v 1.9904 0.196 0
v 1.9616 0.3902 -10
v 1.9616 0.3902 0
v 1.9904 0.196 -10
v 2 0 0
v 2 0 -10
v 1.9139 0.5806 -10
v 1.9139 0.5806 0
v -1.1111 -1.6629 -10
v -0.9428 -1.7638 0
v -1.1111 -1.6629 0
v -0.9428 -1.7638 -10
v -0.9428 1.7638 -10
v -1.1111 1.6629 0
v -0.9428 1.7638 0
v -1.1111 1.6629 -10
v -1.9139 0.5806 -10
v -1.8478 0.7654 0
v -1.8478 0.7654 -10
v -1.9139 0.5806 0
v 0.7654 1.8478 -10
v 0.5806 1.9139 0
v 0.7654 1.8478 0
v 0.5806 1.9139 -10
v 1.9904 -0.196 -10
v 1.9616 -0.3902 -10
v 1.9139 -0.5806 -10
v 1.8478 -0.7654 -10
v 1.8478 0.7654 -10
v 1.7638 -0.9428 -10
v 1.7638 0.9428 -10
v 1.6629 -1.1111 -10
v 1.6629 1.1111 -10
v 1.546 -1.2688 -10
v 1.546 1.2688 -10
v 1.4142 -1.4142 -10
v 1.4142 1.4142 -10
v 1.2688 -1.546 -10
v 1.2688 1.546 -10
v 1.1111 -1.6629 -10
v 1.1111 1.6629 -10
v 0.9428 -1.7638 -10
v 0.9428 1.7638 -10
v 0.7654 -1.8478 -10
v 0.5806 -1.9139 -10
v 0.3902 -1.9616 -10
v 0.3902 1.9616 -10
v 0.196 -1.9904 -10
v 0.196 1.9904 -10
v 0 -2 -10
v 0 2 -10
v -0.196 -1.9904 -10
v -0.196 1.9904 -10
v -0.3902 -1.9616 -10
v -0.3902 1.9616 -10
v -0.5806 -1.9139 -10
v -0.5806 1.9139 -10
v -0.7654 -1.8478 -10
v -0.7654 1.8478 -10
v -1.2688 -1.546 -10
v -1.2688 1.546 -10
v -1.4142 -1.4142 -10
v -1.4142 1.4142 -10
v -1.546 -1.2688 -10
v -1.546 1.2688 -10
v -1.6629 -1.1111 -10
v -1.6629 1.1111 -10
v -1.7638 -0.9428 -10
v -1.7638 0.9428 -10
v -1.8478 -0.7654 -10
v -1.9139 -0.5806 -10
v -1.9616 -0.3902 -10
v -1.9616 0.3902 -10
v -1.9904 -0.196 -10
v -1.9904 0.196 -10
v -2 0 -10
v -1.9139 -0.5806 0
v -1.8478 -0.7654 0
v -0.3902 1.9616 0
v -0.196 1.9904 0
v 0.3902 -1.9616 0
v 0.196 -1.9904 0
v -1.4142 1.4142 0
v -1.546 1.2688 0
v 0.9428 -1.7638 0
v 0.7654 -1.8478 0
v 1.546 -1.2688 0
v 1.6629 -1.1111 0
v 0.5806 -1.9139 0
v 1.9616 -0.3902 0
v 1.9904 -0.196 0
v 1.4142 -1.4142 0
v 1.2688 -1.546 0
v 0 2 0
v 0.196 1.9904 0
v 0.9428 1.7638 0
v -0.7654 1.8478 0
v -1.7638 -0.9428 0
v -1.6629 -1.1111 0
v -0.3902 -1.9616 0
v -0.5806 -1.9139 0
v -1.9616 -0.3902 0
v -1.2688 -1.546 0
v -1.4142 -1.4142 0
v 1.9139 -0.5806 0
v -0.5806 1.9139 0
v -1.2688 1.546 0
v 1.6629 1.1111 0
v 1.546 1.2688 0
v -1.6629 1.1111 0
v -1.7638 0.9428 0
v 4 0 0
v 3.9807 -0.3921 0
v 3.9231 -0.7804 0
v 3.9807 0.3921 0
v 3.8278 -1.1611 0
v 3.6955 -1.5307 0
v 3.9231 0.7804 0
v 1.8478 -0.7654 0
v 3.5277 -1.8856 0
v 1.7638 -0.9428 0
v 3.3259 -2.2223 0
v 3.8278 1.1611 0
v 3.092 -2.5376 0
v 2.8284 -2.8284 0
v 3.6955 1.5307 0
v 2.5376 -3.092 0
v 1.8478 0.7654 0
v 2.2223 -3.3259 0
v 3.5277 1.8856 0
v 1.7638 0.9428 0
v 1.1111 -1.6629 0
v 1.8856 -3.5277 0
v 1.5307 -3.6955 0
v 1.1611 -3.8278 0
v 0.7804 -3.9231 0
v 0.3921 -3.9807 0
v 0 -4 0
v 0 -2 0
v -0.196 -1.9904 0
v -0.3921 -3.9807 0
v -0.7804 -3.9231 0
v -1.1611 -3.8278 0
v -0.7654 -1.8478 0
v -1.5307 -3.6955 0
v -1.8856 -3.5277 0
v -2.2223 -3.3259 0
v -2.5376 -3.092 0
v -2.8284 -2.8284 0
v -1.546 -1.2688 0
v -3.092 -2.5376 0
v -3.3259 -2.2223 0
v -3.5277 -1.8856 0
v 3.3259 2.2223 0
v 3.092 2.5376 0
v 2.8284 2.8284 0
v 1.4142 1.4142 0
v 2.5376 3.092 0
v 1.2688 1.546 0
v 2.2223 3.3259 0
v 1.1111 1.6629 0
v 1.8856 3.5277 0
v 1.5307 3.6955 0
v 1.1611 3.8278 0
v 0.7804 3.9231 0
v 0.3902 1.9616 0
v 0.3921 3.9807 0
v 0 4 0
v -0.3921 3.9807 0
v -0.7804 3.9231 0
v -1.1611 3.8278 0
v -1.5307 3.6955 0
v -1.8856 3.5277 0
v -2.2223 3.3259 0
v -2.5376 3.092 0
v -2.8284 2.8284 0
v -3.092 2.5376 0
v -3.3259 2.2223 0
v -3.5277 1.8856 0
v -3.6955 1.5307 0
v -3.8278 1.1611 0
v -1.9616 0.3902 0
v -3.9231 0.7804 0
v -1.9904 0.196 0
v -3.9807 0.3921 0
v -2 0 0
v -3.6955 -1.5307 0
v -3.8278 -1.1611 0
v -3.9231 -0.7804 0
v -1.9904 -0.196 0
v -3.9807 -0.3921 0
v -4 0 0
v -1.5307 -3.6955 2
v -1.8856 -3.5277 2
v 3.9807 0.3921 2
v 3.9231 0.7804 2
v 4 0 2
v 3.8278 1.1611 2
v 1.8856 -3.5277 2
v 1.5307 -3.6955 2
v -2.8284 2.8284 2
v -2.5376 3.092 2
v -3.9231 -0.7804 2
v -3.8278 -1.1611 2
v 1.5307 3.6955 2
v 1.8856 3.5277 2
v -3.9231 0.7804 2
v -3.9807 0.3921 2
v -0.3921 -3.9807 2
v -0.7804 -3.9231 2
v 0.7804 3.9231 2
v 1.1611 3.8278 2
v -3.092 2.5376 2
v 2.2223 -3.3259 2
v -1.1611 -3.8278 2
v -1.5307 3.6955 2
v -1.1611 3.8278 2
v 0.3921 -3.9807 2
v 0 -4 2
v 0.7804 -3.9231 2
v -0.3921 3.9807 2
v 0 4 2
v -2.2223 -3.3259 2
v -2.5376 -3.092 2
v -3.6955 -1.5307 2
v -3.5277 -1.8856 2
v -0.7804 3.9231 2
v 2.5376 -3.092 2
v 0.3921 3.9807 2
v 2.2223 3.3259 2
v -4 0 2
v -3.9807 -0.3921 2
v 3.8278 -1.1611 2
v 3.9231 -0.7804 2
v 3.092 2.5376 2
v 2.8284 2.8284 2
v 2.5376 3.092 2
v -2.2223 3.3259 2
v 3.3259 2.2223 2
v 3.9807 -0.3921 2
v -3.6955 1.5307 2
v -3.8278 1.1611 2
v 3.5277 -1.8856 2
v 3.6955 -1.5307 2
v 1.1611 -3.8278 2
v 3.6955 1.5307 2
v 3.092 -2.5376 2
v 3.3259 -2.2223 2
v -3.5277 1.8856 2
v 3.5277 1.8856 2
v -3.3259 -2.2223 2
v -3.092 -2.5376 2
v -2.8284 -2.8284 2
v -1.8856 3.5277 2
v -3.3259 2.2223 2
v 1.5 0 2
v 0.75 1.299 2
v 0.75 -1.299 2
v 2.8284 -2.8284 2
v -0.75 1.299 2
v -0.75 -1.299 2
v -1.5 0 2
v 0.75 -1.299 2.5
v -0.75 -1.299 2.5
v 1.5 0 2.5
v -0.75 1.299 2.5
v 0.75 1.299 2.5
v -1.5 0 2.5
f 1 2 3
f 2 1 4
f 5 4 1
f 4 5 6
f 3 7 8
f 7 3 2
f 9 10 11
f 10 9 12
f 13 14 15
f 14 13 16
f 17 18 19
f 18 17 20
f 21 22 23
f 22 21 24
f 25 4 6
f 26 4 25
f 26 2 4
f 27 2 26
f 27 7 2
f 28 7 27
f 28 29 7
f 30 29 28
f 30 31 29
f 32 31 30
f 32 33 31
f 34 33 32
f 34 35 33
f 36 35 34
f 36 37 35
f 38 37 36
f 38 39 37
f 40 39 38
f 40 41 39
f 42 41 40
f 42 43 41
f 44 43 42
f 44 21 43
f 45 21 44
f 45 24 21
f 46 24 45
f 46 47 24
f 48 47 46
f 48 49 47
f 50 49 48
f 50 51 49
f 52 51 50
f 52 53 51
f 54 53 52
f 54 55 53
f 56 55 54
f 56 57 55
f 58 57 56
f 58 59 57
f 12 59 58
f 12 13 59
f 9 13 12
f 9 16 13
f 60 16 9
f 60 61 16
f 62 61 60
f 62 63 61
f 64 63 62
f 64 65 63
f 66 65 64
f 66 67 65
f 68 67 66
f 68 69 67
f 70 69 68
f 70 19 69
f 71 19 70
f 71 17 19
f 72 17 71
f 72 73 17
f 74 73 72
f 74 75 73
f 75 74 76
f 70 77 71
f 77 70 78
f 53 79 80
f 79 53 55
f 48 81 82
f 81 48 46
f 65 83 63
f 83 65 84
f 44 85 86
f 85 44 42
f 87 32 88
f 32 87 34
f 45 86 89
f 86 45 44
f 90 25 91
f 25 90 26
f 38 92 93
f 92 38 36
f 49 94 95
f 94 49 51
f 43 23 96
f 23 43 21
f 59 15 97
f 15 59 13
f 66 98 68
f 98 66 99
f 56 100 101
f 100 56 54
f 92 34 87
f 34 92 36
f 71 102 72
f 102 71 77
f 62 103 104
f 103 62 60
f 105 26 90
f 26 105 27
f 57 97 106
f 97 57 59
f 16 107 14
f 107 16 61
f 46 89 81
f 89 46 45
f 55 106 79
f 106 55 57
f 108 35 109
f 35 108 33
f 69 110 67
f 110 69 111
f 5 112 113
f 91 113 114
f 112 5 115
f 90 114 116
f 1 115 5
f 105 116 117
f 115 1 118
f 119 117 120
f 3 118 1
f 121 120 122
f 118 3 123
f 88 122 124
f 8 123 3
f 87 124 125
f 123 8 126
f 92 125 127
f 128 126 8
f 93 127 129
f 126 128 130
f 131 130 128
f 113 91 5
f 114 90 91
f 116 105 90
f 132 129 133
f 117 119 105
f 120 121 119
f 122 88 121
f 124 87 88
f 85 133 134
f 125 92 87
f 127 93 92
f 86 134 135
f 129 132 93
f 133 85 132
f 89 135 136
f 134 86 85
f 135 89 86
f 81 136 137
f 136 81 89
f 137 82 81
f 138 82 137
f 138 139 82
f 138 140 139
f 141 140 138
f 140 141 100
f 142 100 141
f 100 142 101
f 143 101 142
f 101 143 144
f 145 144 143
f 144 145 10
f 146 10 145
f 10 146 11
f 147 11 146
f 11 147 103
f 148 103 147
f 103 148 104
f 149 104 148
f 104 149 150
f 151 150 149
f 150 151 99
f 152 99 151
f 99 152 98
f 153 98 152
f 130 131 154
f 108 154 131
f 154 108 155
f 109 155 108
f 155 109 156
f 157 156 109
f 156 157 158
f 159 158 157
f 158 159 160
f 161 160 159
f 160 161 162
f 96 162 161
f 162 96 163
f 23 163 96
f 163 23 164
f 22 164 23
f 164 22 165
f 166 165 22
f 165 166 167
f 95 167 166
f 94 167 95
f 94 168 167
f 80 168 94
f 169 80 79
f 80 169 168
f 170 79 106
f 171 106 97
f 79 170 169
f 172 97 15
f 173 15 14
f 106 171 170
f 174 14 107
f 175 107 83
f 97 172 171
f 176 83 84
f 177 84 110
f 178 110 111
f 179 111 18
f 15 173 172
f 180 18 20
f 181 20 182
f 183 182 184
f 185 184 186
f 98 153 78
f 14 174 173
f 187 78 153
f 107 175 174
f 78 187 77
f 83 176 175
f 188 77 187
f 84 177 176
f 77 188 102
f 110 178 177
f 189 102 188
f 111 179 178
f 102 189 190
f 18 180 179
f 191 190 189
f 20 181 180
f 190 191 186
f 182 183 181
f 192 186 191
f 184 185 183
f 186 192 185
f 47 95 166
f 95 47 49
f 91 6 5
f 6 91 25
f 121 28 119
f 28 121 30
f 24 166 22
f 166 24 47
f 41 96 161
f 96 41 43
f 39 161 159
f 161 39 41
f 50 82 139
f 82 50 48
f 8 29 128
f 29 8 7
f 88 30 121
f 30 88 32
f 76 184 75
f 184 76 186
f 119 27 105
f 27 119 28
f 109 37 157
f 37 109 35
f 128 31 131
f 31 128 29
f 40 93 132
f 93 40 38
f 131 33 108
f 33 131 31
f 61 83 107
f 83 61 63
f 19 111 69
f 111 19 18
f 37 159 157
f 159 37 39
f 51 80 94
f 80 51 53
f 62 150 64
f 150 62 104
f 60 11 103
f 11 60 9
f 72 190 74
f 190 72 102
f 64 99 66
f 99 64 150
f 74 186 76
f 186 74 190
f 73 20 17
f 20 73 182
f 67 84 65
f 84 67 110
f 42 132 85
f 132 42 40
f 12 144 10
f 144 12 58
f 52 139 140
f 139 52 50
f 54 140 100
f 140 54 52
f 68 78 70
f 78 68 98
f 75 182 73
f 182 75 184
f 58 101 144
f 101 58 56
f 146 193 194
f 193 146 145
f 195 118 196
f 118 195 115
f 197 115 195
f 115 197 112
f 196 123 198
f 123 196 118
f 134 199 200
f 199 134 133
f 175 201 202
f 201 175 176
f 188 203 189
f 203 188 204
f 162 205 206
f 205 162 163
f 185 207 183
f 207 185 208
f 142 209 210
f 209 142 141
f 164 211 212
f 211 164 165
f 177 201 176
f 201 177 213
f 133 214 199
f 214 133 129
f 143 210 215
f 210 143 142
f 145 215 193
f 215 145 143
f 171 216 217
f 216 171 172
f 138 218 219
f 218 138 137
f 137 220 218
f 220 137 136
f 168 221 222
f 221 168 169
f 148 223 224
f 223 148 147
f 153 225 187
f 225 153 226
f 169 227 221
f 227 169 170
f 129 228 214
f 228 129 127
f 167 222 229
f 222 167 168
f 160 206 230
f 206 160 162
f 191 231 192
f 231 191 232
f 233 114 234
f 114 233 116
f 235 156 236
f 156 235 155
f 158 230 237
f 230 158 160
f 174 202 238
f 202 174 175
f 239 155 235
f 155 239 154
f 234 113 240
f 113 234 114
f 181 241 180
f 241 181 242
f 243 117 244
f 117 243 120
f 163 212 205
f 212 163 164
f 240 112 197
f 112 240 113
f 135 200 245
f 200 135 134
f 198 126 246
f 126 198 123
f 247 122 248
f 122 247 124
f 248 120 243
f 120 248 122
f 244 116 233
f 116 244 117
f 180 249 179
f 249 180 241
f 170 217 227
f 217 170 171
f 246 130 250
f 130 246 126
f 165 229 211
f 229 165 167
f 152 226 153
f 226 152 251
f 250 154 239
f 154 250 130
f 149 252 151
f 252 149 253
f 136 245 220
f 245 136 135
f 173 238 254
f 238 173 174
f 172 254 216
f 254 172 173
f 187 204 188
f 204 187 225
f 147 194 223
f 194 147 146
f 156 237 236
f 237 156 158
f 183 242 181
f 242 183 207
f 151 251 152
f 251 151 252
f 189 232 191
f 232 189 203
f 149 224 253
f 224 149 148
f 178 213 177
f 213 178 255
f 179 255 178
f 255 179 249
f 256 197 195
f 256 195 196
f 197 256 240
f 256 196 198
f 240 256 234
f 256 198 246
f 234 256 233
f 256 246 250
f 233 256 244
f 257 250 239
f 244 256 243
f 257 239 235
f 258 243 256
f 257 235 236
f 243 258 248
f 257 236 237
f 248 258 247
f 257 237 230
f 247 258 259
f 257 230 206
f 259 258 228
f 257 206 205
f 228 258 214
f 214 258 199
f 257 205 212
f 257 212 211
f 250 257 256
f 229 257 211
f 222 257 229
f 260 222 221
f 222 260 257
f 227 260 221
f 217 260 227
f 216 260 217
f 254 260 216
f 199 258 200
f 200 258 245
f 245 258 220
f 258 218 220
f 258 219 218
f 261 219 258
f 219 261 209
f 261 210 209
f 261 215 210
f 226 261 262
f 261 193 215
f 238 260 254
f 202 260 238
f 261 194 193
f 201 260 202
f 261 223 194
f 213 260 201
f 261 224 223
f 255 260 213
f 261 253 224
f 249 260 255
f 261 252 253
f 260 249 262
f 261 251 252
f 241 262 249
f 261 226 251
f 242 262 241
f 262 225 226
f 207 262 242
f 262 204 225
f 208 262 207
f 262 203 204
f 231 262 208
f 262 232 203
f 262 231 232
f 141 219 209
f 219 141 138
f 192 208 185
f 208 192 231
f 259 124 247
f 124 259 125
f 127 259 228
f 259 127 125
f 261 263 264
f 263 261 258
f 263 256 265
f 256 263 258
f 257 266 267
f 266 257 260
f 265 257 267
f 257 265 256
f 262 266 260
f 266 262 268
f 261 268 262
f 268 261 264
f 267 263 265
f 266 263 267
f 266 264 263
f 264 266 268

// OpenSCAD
module socket_head_cap_screw() {
    union() {
        // Screw shaft
        translate([0, 0, -10])
            cylinder(h=10, d=4, $fn=64);
        
        // Screw head
        translate([0, 0, 0])
            cylinder(h=2, d=8, $fn=64);
        
        // Hex socket
        translate([0, 0, 1])
            cylinder(h=1.5, d=3, $fn=6);
    }
}

socket_head_cap_screw();
